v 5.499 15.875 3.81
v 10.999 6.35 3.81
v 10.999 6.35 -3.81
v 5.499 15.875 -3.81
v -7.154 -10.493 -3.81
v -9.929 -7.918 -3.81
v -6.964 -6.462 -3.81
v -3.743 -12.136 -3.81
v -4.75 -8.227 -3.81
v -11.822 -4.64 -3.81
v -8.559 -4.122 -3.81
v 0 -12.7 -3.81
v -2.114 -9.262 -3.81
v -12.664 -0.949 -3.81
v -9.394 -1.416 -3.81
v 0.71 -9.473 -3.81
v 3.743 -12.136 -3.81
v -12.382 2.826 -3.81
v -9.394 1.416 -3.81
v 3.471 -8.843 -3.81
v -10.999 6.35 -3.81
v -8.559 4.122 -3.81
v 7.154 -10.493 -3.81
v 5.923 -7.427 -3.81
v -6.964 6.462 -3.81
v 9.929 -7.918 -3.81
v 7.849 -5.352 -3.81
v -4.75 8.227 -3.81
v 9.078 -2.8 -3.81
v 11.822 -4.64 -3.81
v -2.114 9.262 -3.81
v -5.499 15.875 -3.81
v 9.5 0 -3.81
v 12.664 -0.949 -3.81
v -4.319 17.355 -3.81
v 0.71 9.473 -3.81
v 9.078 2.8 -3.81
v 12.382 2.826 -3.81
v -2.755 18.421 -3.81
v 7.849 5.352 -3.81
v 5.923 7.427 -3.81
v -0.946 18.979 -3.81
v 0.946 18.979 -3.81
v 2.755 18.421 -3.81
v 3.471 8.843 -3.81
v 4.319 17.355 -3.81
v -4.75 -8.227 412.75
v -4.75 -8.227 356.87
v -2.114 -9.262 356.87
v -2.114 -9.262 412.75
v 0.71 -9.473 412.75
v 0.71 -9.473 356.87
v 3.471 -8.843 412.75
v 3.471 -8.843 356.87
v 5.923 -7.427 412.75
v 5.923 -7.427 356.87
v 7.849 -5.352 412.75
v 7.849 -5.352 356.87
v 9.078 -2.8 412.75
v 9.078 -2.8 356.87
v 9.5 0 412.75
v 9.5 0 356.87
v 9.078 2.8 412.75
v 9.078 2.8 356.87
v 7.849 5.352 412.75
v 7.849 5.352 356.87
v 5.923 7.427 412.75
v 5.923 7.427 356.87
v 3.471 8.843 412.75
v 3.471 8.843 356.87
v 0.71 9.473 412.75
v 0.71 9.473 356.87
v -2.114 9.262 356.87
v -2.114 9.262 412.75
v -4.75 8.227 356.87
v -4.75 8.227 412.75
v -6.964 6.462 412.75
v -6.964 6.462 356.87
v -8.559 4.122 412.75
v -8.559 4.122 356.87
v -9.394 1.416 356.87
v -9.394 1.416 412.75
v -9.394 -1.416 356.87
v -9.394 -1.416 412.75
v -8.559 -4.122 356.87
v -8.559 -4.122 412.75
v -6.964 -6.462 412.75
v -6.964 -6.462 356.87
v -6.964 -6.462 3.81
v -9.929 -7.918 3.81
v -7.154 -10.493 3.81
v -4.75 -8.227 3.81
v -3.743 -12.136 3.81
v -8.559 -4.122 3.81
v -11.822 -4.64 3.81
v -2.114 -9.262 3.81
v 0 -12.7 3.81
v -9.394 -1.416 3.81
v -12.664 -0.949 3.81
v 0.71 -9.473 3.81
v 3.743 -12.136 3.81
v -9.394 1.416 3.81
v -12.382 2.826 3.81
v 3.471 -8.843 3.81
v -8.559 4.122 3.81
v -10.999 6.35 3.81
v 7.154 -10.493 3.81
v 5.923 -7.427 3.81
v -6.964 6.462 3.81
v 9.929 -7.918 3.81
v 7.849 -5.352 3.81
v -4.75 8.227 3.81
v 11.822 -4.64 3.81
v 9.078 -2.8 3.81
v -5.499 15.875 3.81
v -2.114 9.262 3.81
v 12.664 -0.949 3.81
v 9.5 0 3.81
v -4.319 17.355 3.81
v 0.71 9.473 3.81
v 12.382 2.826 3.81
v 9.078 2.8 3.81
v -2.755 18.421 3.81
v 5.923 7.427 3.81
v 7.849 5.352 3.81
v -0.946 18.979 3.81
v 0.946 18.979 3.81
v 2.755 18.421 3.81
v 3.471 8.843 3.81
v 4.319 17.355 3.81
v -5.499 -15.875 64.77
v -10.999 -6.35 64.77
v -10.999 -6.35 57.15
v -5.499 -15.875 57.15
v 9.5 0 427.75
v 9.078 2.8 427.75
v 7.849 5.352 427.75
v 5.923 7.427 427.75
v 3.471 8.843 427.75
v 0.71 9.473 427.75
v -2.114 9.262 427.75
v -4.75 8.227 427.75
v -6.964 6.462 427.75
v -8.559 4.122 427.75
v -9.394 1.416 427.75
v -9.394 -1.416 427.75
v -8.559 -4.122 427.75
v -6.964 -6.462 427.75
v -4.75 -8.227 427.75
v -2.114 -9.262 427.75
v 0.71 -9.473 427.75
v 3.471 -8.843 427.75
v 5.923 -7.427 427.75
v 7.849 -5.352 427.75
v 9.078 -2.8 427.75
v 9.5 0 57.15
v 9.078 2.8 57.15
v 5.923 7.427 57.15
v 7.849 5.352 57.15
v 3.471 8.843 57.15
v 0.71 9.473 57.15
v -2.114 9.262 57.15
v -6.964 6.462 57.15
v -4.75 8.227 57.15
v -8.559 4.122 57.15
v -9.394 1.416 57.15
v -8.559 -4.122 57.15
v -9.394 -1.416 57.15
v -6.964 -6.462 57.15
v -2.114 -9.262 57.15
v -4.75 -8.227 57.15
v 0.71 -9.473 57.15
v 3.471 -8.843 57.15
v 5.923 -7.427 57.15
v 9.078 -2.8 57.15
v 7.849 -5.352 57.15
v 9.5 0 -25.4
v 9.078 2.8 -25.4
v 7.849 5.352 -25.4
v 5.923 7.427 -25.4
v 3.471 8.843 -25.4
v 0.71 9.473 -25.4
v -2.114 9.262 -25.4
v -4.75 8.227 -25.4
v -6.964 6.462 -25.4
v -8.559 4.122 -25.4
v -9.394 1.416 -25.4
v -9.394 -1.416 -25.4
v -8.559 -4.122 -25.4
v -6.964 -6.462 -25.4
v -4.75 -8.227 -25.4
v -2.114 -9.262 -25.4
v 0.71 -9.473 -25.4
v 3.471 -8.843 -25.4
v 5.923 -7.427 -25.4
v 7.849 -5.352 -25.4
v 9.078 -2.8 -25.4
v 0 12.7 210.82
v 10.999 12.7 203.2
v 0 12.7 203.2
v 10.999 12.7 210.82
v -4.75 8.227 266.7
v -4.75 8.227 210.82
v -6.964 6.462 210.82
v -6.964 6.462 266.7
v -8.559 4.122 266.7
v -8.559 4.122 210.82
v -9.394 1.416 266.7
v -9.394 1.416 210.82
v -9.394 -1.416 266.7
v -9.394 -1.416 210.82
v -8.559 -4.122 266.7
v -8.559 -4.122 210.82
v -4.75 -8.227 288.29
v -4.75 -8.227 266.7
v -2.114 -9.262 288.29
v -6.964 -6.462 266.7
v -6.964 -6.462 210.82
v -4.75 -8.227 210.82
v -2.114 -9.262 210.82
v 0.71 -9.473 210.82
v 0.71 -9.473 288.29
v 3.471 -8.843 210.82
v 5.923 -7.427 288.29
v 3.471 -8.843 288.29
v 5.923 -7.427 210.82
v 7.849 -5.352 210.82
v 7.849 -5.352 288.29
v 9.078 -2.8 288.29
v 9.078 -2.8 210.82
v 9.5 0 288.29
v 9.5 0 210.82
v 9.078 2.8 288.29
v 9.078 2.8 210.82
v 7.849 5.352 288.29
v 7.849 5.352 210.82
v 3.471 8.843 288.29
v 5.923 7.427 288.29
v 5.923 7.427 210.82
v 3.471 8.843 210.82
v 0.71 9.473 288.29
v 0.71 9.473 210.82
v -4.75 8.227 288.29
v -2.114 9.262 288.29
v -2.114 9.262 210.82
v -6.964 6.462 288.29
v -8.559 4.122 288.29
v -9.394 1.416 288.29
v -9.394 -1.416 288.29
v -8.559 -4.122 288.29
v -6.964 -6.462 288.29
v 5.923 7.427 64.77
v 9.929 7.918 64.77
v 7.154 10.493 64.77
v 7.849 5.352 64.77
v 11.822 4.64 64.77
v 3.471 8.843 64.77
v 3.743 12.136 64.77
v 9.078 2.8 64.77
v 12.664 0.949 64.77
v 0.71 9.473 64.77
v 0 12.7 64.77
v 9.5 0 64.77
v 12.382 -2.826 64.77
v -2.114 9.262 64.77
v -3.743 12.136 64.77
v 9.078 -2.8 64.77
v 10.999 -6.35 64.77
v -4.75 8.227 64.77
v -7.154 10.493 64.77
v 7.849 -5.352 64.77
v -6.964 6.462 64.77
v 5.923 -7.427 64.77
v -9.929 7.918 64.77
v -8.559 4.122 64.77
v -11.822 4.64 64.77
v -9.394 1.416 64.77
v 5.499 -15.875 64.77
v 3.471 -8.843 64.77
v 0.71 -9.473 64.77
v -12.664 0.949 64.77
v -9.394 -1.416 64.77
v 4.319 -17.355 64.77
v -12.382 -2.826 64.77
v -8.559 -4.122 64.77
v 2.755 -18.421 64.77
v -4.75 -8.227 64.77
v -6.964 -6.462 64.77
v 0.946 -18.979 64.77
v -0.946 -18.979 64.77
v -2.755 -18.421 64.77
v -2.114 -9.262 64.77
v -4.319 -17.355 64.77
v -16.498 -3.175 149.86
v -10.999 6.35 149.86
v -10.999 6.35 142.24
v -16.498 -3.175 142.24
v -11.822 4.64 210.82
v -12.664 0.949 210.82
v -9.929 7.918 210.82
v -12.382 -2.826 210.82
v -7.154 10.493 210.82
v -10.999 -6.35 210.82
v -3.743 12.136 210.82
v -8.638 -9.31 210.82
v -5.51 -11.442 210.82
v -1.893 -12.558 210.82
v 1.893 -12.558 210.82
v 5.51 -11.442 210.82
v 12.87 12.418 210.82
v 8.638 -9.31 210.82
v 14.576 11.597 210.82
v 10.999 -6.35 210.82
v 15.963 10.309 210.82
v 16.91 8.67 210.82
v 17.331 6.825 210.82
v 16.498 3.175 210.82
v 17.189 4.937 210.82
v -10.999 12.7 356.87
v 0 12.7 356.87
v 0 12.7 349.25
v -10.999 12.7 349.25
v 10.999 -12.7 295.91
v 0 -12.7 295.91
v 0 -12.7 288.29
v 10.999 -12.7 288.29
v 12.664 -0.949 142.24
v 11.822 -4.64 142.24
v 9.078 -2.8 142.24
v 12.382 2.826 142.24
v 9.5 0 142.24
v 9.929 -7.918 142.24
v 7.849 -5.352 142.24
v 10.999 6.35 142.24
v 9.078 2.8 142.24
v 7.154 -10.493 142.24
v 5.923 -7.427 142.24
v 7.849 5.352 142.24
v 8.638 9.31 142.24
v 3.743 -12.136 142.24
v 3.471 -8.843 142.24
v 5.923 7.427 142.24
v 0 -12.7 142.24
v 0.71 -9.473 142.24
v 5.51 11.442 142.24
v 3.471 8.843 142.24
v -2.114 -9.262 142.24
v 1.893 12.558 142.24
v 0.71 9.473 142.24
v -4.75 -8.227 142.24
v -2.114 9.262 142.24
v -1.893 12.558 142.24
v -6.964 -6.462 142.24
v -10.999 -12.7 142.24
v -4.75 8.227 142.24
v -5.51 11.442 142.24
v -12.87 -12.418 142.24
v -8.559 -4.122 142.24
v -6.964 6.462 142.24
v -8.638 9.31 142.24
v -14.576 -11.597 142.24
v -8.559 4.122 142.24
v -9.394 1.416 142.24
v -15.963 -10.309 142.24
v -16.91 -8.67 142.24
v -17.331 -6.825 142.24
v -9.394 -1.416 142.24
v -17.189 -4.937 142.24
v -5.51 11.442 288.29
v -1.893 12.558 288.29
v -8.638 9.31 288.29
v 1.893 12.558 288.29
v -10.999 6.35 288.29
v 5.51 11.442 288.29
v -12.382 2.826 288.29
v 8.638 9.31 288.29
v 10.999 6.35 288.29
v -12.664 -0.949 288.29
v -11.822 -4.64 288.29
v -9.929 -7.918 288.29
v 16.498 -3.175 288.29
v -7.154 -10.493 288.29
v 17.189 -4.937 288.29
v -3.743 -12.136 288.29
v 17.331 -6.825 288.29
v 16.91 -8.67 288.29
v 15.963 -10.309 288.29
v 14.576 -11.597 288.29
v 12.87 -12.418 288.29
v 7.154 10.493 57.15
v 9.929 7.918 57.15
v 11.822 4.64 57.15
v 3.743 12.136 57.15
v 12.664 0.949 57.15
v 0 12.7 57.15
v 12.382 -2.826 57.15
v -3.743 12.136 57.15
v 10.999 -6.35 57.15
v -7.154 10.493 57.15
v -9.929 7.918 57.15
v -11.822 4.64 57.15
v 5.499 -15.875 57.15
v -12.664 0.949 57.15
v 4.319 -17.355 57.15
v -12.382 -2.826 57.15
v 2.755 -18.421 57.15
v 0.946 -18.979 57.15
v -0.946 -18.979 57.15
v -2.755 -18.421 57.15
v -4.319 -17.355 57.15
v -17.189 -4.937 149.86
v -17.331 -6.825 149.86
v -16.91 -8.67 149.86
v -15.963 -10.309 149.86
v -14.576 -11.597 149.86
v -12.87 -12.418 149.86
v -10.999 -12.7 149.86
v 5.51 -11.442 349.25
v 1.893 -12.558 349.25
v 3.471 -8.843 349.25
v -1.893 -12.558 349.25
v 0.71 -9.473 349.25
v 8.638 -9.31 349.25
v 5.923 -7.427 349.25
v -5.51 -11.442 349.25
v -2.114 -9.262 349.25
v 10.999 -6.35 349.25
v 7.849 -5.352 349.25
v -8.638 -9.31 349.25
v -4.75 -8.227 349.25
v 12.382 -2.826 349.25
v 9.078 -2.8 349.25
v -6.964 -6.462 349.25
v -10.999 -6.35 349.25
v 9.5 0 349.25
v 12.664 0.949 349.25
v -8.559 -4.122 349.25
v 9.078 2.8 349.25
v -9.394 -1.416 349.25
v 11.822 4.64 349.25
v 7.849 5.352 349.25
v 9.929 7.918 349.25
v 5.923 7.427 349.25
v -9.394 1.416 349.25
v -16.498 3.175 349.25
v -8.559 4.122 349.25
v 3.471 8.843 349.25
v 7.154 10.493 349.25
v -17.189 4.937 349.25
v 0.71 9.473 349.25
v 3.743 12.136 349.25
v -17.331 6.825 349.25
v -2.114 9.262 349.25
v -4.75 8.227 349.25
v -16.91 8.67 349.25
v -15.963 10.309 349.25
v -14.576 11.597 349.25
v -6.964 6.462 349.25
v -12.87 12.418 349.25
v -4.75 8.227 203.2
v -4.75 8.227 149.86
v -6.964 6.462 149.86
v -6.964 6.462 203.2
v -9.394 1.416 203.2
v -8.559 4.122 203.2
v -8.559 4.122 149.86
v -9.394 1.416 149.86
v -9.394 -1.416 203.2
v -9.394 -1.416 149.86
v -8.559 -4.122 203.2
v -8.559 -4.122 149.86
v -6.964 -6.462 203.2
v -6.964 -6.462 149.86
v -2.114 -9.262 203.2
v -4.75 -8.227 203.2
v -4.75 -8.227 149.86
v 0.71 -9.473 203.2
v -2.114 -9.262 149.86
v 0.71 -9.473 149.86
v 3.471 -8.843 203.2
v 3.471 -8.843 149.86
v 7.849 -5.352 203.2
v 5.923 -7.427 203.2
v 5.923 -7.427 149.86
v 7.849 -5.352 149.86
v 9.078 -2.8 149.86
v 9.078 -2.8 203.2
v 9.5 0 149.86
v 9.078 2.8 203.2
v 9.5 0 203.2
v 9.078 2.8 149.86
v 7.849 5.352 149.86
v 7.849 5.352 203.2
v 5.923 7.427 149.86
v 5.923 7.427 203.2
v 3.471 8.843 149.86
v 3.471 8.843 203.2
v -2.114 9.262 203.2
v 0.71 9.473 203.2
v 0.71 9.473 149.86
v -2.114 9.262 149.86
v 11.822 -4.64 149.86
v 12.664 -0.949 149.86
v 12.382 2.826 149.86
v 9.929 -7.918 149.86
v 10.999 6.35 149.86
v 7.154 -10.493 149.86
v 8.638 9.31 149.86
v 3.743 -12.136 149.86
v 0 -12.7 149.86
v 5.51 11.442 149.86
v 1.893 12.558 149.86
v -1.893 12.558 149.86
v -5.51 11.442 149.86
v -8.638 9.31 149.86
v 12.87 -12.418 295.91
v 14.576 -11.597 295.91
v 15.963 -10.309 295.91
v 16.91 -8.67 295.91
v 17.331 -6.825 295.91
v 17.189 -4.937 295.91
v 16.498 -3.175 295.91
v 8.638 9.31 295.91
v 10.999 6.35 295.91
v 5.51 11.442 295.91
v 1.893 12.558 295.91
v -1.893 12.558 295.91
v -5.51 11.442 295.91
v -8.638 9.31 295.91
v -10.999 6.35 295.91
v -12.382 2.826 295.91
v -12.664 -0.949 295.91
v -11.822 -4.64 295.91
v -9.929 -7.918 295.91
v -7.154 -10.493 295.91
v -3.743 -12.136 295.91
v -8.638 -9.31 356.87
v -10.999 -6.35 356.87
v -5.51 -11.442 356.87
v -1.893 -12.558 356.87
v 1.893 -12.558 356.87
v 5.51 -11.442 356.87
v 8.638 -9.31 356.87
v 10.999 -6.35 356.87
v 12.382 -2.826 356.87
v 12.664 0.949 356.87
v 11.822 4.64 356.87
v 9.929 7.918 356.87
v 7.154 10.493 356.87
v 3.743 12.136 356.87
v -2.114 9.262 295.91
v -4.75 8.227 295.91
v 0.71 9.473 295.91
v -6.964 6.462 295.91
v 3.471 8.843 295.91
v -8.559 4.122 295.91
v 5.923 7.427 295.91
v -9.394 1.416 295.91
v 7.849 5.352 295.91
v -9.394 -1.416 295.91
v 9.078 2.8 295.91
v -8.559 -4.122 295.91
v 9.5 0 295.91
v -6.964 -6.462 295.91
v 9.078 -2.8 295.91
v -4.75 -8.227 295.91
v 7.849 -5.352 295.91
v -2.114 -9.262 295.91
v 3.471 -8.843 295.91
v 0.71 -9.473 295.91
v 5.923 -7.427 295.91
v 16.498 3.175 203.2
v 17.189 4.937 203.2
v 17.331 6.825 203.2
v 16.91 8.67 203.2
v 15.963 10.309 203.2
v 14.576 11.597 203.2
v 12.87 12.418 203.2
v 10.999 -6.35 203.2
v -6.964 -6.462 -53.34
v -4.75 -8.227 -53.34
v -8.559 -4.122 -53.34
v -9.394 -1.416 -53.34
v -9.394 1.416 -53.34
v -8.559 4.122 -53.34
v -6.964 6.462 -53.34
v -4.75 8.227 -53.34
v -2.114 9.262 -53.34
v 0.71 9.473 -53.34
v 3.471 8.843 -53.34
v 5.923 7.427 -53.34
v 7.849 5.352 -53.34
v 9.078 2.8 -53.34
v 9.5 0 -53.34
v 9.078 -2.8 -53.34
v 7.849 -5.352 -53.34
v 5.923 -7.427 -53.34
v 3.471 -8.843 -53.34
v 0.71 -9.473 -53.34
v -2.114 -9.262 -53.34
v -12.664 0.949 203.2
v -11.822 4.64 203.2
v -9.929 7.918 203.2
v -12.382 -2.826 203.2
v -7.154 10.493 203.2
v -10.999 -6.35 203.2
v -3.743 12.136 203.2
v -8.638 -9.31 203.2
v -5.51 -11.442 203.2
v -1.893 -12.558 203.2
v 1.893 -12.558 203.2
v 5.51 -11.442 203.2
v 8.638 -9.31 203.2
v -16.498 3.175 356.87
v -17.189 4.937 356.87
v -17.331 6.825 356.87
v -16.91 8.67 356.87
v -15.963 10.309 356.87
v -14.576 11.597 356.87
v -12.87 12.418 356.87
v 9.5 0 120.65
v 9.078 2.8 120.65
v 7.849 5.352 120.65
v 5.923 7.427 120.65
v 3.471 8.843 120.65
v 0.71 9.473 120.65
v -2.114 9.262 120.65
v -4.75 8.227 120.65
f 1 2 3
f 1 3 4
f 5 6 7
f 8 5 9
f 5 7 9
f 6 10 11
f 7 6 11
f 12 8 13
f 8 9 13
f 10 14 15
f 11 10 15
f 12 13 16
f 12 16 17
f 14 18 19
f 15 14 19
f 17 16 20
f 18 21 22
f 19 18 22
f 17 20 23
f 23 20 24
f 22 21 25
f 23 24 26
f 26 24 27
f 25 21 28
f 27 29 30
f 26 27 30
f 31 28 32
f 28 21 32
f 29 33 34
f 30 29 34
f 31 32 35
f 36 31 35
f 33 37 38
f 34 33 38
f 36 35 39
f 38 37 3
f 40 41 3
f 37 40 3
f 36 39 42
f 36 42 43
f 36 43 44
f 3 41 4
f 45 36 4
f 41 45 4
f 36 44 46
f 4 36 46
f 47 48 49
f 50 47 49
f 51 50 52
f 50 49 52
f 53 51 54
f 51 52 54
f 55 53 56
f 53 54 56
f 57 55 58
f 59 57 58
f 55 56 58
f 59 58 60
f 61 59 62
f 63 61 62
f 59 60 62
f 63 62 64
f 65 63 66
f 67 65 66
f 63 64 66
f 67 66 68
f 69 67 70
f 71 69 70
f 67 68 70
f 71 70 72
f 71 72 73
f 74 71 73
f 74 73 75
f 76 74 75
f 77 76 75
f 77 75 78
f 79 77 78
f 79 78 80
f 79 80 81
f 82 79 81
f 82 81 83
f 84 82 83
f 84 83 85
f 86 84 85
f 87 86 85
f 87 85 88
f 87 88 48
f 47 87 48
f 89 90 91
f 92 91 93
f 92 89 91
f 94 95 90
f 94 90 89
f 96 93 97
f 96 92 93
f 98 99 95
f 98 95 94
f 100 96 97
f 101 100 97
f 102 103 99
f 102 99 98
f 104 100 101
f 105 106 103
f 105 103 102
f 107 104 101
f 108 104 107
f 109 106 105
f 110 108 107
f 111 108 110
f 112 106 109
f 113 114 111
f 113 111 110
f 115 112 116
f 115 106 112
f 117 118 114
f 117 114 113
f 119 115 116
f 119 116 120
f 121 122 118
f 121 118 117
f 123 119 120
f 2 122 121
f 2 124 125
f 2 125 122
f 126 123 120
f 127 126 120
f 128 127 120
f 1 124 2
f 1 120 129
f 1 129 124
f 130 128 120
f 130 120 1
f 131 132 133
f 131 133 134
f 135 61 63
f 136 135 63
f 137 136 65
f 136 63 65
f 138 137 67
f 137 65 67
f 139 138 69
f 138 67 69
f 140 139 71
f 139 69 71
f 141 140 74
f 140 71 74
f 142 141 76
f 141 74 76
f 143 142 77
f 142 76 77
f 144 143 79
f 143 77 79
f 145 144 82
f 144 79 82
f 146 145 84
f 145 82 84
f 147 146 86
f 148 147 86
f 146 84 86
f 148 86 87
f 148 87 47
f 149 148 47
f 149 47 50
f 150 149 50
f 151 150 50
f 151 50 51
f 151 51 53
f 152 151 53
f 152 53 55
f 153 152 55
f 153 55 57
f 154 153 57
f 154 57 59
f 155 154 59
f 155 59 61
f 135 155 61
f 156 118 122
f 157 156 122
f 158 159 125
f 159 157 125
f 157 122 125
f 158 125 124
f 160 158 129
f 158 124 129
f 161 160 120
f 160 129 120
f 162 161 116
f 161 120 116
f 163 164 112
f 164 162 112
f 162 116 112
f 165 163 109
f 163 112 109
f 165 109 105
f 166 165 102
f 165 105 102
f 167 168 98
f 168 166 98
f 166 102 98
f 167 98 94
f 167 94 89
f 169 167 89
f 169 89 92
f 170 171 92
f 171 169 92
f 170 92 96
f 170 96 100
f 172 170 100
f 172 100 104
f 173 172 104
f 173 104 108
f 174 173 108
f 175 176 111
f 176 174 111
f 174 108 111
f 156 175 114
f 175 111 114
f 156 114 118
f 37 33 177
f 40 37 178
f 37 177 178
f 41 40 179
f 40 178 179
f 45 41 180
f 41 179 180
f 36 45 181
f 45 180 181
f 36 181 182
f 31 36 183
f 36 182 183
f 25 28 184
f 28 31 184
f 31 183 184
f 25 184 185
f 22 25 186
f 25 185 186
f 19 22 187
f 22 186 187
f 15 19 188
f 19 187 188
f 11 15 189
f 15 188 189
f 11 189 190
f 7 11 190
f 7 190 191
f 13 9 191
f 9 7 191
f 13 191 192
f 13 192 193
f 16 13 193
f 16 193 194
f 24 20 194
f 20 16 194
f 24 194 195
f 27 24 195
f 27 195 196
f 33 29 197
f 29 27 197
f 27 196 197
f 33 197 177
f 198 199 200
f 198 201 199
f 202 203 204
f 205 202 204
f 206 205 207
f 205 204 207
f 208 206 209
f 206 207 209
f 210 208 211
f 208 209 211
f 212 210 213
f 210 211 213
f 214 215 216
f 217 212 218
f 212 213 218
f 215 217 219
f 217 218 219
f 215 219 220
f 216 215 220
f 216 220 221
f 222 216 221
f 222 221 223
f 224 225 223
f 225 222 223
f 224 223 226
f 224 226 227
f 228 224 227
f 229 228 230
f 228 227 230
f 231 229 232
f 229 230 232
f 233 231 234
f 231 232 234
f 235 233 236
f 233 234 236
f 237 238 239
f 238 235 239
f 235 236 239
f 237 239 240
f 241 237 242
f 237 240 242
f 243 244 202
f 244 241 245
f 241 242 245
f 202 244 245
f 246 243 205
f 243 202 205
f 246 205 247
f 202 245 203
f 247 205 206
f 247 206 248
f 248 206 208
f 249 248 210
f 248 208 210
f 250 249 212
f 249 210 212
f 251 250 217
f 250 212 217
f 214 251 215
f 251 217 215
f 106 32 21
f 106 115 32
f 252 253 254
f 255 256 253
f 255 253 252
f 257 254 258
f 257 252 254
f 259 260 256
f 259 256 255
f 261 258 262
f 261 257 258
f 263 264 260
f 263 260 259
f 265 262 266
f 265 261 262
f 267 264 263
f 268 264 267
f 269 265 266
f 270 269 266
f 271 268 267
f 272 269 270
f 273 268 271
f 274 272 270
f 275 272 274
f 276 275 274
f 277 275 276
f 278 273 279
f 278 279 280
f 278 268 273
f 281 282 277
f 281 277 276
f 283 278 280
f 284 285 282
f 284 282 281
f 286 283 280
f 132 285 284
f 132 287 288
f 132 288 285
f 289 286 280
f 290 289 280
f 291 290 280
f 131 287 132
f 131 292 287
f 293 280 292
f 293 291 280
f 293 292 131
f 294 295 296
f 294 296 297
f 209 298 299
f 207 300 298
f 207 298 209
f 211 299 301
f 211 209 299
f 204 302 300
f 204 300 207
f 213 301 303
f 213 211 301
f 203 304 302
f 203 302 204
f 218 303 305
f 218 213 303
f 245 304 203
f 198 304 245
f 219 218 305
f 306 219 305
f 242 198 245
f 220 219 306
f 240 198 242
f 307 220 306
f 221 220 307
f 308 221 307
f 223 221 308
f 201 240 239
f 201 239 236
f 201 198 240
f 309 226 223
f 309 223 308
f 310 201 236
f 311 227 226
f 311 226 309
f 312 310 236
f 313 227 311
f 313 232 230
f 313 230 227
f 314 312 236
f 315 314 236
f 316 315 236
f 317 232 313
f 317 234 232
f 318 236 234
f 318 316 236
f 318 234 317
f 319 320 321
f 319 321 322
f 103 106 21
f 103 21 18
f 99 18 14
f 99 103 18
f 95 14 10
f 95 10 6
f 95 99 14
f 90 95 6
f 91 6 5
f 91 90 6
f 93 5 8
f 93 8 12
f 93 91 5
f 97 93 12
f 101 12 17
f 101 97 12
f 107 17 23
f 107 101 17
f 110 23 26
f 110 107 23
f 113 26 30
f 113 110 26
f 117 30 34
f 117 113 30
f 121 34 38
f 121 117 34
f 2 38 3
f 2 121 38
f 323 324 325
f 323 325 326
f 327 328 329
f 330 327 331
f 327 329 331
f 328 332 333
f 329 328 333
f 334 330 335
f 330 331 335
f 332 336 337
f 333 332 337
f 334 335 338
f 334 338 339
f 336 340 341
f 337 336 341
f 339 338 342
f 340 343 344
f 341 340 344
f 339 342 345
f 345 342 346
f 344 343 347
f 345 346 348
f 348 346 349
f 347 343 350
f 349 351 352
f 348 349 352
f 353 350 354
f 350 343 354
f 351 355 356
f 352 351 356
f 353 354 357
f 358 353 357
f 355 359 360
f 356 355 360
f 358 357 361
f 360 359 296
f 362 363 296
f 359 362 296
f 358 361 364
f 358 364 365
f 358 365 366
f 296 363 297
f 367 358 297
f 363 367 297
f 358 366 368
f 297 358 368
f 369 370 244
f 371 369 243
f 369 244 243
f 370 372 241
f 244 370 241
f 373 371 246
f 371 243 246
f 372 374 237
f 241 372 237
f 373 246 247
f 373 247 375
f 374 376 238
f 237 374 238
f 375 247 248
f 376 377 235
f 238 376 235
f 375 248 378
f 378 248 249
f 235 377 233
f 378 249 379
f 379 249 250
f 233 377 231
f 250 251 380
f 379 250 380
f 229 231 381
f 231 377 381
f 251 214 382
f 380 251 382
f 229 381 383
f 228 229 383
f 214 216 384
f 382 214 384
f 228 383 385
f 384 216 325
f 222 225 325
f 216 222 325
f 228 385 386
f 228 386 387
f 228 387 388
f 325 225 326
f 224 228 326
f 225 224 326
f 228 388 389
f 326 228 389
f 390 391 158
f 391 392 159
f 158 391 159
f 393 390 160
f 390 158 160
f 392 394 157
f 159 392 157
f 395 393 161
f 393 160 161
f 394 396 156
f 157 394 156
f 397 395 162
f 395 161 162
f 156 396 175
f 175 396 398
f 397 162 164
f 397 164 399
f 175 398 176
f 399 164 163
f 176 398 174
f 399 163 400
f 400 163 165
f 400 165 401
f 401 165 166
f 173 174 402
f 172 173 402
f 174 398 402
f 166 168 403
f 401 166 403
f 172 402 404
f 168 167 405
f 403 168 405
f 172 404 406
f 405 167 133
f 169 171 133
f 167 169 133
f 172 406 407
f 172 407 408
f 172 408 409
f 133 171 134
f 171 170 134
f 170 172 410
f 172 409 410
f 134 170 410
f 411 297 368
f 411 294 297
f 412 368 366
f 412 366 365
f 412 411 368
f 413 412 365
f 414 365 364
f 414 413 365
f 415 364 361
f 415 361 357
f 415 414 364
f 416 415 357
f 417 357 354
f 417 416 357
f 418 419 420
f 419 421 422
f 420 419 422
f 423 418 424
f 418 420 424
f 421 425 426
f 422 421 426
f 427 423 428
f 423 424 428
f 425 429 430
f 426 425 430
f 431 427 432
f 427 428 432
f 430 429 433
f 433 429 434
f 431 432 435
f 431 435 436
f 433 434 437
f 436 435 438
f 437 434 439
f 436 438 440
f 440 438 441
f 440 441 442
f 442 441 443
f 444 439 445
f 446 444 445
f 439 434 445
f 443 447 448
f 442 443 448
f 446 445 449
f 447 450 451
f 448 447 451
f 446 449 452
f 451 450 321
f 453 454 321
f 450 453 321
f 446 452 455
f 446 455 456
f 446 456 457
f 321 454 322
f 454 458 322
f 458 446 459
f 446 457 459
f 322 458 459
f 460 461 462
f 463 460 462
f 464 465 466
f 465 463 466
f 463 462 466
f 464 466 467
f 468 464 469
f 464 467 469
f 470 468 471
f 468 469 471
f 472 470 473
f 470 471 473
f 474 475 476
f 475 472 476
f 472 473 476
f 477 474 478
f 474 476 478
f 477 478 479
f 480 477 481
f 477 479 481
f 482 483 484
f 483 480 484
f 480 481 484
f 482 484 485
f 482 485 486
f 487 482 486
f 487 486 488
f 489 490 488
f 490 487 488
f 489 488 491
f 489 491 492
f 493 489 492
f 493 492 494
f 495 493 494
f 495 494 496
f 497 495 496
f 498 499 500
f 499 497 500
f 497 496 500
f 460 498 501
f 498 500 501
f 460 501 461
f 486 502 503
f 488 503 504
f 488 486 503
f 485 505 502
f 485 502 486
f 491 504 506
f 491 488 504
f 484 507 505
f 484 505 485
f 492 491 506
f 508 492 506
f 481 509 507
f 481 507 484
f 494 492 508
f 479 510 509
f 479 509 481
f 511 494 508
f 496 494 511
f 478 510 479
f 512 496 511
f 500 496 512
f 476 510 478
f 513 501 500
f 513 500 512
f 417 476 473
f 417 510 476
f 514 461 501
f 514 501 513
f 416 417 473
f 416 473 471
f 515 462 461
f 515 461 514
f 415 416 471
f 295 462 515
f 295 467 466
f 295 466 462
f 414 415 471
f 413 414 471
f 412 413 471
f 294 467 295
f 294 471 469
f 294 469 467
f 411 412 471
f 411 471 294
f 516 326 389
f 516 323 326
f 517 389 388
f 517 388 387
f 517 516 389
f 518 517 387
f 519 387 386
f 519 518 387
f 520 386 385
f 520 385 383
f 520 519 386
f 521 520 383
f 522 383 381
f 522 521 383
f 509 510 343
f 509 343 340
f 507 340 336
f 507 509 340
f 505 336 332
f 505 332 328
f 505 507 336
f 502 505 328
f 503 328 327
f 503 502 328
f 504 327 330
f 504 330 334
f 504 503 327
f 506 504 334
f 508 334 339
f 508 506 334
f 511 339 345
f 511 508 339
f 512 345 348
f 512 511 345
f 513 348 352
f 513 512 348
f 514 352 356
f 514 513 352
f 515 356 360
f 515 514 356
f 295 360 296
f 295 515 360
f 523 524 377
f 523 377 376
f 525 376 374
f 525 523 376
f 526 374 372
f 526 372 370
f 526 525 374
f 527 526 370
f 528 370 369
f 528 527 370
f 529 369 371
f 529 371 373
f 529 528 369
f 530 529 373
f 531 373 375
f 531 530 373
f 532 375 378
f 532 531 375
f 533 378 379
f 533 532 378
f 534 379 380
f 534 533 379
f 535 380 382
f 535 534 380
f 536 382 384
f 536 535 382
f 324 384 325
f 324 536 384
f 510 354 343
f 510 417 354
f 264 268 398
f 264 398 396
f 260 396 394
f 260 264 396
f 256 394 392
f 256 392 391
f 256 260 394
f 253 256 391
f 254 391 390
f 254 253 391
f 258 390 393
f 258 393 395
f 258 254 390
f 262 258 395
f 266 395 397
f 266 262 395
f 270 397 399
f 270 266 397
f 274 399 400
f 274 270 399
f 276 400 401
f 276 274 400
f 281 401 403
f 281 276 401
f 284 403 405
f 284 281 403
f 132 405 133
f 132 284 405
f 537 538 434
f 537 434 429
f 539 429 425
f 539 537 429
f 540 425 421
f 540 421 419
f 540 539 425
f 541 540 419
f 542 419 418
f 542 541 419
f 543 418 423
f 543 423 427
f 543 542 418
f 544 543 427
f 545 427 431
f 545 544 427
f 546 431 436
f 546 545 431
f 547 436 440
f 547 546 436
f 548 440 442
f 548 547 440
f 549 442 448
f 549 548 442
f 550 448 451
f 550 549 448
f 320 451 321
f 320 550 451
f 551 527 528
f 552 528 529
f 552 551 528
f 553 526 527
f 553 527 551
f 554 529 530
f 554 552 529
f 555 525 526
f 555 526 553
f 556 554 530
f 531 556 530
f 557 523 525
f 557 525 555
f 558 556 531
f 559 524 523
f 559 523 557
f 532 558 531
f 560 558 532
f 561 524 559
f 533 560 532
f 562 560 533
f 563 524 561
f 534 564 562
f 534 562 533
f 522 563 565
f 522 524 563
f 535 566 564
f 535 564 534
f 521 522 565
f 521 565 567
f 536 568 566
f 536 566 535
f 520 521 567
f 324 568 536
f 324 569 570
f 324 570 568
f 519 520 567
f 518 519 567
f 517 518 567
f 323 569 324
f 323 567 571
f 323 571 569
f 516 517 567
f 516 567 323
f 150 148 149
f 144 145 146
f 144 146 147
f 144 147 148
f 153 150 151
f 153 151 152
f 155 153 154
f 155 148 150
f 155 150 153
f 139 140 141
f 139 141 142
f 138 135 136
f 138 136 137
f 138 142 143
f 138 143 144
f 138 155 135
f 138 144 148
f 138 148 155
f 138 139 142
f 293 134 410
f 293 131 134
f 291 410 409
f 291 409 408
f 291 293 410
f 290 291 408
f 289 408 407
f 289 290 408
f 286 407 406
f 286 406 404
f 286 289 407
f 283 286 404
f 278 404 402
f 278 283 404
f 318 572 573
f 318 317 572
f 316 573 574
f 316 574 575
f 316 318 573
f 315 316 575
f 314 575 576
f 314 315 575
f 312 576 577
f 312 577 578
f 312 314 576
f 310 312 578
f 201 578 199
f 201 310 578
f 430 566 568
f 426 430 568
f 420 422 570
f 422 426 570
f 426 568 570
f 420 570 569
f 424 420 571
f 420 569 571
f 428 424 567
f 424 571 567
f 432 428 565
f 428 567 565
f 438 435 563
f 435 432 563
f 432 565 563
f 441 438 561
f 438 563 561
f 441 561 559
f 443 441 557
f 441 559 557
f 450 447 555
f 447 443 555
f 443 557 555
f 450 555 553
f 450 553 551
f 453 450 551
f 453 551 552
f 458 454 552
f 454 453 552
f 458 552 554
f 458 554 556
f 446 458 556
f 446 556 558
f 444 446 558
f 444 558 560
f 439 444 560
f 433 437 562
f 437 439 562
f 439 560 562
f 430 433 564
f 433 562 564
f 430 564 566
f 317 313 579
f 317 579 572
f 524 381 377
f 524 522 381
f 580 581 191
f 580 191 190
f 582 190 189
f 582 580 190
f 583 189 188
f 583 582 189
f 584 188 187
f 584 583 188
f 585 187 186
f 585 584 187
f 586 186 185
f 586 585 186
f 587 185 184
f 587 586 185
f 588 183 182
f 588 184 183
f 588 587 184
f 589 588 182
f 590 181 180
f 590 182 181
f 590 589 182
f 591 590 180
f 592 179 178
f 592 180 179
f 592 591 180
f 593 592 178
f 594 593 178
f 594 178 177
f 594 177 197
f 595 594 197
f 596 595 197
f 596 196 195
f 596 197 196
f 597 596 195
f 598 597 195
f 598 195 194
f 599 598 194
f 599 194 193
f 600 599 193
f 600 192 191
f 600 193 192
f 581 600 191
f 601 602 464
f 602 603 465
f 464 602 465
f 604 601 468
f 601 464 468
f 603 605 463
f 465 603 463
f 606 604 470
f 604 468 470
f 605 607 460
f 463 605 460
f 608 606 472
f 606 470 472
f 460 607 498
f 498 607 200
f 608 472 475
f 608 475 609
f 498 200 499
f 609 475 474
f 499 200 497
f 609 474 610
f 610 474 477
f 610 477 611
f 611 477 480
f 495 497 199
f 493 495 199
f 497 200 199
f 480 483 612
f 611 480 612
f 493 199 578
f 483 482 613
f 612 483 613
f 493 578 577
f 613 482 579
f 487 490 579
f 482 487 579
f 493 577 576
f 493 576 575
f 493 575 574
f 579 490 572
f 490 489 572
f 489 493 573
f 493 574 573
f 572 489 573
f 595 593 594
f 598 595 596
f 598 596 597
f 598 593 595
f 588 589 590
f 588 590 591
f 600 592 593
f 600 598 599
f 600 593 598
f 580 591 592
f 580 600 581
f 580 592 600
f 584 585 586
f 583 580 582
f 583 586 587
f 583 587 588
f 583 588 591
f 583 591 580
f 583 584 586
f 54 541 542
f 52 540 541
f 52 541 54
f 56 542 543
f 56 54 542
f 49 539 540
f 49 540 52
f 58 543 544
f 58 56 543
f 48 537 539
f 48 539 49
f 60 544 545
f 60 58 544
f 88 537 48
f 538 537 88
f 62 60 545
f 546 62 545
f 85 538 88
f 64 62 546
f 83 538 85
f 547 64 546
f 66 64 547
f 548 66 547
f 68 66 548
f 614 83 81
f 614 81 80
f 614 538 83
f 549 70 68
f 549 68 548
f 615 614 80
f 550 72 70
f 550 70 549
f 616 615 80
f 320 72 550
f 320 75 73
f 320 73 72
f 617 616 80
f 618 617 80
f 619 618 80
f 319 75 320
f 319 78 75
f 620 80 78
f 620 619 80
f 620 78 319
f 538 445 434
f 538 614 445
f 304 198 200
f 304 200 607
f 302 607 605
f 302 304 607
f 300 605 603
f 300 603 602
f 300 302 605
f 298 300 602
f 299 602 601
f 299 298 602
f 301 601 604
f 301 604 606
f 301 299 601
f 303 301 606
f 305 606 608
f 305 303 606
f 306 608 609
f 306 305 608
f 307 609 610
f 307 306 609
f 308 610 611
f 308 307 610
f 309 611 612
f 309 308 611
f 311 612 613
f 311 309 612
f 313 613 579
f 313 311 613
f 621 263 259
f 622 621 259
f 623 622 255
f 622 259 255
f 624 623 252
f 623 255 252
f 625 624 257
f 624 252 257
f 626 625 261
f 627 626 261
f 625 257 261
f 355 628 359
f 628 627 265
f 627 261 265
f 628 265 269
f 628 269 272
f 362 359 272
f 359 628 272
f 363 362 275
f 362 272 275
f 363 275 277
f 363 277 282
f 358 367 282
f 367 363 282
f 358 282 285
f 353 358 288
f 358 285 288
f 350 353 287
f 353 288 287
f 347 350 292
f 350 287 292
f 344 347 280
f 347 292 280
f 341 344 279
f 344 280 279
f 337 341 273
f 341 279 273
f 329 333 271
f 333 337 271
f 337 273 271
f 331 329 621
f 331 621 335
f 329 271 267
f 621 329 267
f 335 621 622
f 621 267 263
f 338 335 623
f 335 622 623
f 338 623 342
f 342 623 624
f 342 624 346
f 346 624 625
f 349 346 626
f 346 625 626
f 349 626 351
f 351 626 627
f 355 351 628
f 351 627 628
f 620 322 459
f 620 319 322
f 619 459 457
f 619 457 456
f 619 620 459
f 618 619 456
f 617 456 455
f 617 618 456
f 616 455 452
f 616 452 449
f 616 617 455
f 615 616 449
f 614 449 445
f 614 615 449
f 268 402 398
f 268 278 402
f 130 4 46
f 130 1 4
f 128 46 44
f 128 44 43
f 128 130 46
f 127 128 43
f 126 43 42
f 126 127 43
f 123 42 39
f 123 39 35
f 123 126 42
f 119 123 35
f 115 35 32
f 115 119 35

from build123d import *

# Parameters (mm, degrees)
BOSS_EXTRUDE1_DEPTH   = 3.81
BODY_MOVE_COPY2_ANGLE = 180
BOSS_EXTRUDE2_START   = -25.4
SKETCH2_R             = 9.5
BOSS_EXTRUDE2_DEPTH   = 146.05
LPATTERN1_COUNT       = 3
LPATTERN1_PITCH       = 146.05
BODY_MOVE_COPY3_ANGLE = 120
BODY_MOVE_COPY4_ANGLE = 120
BOSS_EXTRUDE3_START   = 27.94
SKETCH3_R             = 9.5
BOSS_EXTRUDE3_DEPTH   = 27.94
SKETCH4_R             = 9.5
BOSS_EXTRUDE4_DEPTH   = 15


with BuildPart() as part:
    # Sketch1 → Boss-Extrude1 (new, symmetric)
    with BuildSketch(Plane.XY):
        with BuildLine():
            Line((-5.499261314, 15.875), (-10.998522628, 6.35))
            ThreePointArc((-10.998522628, 6.35), (0, -12.7), (10.998522628, 6.35))
            Line((10.998522628, 6.35), (5.499261314, 15.875))
            ThreePointArc((5.499261314, 15.875), (0, 19.05), (-5.499261314, 15.875))
        make_face()
    extrude(amount=BOSS_EXTRUDE1_DEPTH, both=True)


with BuildPart() as body_2:
    # Body-Move/Copy1: copy of part
    add(part.part.moved(Location((0, 0, 60.96))))


with BuildPart() as body_2_1:
    # Body-Move/Copy2: moved
    add(body_2.part.rotate(Axis((0, 0, 0), (0, 0, 1)), BODY_MOVE_COPY2_ANGLE))


with BuildPart() as part_1:
    add(part.part)

    add(body_2_1.part)  # Boss-Extrude2 merges body 2
    # Sketch2 → Boss-Extrude2 (add)
    with BuildSketch(Plane.XY.offset(BOSS_EXTRUDE2_START)):
        Circle(SKETCH2_R)
    extrude(amount=BOSS_EXTRUDE2_DEPTH)


with BuildPart() as lpattern1_1:
    # LPattern1: pattern copy
    add(part_1.part.moved(Location(Vector(0, 0, 1) * (1 * LPATTERN1_PITCH))))


with BuildPart() as lpattern1_2:
    # LPattern1: pattern copy
    add(part_1.part.moved(Location(Vector(0, 0, 1) * (2 * LPATTERN1_PITCH))))


with BuildPart() as lpattern1_1_1:
    # Body-Move/Copy3: moved
    add(lpattern1_1.part.rotate(Axis((0, 0, 0), (0, 0, 1)), BODY_MOVE_COPY3_ANGLE))


with BuildPart() as lpattern1_2_1:
    # Body-Move/Copy4: moved
    add(lpattern1_2.part.rotate(Axis((0, 0, 0), (0, 0, -1)), BODY_MOVE_COPY4_ANGLE))


with BuildPart() as part_2:
    add(part_1.part)

    # Sketch3 → Boss-Extrude3 (add)
    with BuildSketch(Plane(origin=(0, 0, -25.4), x_dir=(-1, 0, 0), z_dir=(0, 0, -1)).offset(BOSS_EXTRUDE3_START)):
        Circle(SKETCH3_R)
    extrude(amount=-BOSS_EXTRUDE3_DEPTH)

    # Combine1: union LPattern1_1, LPattern1_2
    add(lpattern1_1_1.part)
    add(lpattern1_2_1.part)

    # Sketch4 → Boss-Extrude4 (add)
    with BuildSketch(Plane.XY.offset(412.75)):
        Circle(SKETCH4_R)
    extrude(amount=BOSS_EXTRUDE4_DEPTH)


solid = part_2.part
